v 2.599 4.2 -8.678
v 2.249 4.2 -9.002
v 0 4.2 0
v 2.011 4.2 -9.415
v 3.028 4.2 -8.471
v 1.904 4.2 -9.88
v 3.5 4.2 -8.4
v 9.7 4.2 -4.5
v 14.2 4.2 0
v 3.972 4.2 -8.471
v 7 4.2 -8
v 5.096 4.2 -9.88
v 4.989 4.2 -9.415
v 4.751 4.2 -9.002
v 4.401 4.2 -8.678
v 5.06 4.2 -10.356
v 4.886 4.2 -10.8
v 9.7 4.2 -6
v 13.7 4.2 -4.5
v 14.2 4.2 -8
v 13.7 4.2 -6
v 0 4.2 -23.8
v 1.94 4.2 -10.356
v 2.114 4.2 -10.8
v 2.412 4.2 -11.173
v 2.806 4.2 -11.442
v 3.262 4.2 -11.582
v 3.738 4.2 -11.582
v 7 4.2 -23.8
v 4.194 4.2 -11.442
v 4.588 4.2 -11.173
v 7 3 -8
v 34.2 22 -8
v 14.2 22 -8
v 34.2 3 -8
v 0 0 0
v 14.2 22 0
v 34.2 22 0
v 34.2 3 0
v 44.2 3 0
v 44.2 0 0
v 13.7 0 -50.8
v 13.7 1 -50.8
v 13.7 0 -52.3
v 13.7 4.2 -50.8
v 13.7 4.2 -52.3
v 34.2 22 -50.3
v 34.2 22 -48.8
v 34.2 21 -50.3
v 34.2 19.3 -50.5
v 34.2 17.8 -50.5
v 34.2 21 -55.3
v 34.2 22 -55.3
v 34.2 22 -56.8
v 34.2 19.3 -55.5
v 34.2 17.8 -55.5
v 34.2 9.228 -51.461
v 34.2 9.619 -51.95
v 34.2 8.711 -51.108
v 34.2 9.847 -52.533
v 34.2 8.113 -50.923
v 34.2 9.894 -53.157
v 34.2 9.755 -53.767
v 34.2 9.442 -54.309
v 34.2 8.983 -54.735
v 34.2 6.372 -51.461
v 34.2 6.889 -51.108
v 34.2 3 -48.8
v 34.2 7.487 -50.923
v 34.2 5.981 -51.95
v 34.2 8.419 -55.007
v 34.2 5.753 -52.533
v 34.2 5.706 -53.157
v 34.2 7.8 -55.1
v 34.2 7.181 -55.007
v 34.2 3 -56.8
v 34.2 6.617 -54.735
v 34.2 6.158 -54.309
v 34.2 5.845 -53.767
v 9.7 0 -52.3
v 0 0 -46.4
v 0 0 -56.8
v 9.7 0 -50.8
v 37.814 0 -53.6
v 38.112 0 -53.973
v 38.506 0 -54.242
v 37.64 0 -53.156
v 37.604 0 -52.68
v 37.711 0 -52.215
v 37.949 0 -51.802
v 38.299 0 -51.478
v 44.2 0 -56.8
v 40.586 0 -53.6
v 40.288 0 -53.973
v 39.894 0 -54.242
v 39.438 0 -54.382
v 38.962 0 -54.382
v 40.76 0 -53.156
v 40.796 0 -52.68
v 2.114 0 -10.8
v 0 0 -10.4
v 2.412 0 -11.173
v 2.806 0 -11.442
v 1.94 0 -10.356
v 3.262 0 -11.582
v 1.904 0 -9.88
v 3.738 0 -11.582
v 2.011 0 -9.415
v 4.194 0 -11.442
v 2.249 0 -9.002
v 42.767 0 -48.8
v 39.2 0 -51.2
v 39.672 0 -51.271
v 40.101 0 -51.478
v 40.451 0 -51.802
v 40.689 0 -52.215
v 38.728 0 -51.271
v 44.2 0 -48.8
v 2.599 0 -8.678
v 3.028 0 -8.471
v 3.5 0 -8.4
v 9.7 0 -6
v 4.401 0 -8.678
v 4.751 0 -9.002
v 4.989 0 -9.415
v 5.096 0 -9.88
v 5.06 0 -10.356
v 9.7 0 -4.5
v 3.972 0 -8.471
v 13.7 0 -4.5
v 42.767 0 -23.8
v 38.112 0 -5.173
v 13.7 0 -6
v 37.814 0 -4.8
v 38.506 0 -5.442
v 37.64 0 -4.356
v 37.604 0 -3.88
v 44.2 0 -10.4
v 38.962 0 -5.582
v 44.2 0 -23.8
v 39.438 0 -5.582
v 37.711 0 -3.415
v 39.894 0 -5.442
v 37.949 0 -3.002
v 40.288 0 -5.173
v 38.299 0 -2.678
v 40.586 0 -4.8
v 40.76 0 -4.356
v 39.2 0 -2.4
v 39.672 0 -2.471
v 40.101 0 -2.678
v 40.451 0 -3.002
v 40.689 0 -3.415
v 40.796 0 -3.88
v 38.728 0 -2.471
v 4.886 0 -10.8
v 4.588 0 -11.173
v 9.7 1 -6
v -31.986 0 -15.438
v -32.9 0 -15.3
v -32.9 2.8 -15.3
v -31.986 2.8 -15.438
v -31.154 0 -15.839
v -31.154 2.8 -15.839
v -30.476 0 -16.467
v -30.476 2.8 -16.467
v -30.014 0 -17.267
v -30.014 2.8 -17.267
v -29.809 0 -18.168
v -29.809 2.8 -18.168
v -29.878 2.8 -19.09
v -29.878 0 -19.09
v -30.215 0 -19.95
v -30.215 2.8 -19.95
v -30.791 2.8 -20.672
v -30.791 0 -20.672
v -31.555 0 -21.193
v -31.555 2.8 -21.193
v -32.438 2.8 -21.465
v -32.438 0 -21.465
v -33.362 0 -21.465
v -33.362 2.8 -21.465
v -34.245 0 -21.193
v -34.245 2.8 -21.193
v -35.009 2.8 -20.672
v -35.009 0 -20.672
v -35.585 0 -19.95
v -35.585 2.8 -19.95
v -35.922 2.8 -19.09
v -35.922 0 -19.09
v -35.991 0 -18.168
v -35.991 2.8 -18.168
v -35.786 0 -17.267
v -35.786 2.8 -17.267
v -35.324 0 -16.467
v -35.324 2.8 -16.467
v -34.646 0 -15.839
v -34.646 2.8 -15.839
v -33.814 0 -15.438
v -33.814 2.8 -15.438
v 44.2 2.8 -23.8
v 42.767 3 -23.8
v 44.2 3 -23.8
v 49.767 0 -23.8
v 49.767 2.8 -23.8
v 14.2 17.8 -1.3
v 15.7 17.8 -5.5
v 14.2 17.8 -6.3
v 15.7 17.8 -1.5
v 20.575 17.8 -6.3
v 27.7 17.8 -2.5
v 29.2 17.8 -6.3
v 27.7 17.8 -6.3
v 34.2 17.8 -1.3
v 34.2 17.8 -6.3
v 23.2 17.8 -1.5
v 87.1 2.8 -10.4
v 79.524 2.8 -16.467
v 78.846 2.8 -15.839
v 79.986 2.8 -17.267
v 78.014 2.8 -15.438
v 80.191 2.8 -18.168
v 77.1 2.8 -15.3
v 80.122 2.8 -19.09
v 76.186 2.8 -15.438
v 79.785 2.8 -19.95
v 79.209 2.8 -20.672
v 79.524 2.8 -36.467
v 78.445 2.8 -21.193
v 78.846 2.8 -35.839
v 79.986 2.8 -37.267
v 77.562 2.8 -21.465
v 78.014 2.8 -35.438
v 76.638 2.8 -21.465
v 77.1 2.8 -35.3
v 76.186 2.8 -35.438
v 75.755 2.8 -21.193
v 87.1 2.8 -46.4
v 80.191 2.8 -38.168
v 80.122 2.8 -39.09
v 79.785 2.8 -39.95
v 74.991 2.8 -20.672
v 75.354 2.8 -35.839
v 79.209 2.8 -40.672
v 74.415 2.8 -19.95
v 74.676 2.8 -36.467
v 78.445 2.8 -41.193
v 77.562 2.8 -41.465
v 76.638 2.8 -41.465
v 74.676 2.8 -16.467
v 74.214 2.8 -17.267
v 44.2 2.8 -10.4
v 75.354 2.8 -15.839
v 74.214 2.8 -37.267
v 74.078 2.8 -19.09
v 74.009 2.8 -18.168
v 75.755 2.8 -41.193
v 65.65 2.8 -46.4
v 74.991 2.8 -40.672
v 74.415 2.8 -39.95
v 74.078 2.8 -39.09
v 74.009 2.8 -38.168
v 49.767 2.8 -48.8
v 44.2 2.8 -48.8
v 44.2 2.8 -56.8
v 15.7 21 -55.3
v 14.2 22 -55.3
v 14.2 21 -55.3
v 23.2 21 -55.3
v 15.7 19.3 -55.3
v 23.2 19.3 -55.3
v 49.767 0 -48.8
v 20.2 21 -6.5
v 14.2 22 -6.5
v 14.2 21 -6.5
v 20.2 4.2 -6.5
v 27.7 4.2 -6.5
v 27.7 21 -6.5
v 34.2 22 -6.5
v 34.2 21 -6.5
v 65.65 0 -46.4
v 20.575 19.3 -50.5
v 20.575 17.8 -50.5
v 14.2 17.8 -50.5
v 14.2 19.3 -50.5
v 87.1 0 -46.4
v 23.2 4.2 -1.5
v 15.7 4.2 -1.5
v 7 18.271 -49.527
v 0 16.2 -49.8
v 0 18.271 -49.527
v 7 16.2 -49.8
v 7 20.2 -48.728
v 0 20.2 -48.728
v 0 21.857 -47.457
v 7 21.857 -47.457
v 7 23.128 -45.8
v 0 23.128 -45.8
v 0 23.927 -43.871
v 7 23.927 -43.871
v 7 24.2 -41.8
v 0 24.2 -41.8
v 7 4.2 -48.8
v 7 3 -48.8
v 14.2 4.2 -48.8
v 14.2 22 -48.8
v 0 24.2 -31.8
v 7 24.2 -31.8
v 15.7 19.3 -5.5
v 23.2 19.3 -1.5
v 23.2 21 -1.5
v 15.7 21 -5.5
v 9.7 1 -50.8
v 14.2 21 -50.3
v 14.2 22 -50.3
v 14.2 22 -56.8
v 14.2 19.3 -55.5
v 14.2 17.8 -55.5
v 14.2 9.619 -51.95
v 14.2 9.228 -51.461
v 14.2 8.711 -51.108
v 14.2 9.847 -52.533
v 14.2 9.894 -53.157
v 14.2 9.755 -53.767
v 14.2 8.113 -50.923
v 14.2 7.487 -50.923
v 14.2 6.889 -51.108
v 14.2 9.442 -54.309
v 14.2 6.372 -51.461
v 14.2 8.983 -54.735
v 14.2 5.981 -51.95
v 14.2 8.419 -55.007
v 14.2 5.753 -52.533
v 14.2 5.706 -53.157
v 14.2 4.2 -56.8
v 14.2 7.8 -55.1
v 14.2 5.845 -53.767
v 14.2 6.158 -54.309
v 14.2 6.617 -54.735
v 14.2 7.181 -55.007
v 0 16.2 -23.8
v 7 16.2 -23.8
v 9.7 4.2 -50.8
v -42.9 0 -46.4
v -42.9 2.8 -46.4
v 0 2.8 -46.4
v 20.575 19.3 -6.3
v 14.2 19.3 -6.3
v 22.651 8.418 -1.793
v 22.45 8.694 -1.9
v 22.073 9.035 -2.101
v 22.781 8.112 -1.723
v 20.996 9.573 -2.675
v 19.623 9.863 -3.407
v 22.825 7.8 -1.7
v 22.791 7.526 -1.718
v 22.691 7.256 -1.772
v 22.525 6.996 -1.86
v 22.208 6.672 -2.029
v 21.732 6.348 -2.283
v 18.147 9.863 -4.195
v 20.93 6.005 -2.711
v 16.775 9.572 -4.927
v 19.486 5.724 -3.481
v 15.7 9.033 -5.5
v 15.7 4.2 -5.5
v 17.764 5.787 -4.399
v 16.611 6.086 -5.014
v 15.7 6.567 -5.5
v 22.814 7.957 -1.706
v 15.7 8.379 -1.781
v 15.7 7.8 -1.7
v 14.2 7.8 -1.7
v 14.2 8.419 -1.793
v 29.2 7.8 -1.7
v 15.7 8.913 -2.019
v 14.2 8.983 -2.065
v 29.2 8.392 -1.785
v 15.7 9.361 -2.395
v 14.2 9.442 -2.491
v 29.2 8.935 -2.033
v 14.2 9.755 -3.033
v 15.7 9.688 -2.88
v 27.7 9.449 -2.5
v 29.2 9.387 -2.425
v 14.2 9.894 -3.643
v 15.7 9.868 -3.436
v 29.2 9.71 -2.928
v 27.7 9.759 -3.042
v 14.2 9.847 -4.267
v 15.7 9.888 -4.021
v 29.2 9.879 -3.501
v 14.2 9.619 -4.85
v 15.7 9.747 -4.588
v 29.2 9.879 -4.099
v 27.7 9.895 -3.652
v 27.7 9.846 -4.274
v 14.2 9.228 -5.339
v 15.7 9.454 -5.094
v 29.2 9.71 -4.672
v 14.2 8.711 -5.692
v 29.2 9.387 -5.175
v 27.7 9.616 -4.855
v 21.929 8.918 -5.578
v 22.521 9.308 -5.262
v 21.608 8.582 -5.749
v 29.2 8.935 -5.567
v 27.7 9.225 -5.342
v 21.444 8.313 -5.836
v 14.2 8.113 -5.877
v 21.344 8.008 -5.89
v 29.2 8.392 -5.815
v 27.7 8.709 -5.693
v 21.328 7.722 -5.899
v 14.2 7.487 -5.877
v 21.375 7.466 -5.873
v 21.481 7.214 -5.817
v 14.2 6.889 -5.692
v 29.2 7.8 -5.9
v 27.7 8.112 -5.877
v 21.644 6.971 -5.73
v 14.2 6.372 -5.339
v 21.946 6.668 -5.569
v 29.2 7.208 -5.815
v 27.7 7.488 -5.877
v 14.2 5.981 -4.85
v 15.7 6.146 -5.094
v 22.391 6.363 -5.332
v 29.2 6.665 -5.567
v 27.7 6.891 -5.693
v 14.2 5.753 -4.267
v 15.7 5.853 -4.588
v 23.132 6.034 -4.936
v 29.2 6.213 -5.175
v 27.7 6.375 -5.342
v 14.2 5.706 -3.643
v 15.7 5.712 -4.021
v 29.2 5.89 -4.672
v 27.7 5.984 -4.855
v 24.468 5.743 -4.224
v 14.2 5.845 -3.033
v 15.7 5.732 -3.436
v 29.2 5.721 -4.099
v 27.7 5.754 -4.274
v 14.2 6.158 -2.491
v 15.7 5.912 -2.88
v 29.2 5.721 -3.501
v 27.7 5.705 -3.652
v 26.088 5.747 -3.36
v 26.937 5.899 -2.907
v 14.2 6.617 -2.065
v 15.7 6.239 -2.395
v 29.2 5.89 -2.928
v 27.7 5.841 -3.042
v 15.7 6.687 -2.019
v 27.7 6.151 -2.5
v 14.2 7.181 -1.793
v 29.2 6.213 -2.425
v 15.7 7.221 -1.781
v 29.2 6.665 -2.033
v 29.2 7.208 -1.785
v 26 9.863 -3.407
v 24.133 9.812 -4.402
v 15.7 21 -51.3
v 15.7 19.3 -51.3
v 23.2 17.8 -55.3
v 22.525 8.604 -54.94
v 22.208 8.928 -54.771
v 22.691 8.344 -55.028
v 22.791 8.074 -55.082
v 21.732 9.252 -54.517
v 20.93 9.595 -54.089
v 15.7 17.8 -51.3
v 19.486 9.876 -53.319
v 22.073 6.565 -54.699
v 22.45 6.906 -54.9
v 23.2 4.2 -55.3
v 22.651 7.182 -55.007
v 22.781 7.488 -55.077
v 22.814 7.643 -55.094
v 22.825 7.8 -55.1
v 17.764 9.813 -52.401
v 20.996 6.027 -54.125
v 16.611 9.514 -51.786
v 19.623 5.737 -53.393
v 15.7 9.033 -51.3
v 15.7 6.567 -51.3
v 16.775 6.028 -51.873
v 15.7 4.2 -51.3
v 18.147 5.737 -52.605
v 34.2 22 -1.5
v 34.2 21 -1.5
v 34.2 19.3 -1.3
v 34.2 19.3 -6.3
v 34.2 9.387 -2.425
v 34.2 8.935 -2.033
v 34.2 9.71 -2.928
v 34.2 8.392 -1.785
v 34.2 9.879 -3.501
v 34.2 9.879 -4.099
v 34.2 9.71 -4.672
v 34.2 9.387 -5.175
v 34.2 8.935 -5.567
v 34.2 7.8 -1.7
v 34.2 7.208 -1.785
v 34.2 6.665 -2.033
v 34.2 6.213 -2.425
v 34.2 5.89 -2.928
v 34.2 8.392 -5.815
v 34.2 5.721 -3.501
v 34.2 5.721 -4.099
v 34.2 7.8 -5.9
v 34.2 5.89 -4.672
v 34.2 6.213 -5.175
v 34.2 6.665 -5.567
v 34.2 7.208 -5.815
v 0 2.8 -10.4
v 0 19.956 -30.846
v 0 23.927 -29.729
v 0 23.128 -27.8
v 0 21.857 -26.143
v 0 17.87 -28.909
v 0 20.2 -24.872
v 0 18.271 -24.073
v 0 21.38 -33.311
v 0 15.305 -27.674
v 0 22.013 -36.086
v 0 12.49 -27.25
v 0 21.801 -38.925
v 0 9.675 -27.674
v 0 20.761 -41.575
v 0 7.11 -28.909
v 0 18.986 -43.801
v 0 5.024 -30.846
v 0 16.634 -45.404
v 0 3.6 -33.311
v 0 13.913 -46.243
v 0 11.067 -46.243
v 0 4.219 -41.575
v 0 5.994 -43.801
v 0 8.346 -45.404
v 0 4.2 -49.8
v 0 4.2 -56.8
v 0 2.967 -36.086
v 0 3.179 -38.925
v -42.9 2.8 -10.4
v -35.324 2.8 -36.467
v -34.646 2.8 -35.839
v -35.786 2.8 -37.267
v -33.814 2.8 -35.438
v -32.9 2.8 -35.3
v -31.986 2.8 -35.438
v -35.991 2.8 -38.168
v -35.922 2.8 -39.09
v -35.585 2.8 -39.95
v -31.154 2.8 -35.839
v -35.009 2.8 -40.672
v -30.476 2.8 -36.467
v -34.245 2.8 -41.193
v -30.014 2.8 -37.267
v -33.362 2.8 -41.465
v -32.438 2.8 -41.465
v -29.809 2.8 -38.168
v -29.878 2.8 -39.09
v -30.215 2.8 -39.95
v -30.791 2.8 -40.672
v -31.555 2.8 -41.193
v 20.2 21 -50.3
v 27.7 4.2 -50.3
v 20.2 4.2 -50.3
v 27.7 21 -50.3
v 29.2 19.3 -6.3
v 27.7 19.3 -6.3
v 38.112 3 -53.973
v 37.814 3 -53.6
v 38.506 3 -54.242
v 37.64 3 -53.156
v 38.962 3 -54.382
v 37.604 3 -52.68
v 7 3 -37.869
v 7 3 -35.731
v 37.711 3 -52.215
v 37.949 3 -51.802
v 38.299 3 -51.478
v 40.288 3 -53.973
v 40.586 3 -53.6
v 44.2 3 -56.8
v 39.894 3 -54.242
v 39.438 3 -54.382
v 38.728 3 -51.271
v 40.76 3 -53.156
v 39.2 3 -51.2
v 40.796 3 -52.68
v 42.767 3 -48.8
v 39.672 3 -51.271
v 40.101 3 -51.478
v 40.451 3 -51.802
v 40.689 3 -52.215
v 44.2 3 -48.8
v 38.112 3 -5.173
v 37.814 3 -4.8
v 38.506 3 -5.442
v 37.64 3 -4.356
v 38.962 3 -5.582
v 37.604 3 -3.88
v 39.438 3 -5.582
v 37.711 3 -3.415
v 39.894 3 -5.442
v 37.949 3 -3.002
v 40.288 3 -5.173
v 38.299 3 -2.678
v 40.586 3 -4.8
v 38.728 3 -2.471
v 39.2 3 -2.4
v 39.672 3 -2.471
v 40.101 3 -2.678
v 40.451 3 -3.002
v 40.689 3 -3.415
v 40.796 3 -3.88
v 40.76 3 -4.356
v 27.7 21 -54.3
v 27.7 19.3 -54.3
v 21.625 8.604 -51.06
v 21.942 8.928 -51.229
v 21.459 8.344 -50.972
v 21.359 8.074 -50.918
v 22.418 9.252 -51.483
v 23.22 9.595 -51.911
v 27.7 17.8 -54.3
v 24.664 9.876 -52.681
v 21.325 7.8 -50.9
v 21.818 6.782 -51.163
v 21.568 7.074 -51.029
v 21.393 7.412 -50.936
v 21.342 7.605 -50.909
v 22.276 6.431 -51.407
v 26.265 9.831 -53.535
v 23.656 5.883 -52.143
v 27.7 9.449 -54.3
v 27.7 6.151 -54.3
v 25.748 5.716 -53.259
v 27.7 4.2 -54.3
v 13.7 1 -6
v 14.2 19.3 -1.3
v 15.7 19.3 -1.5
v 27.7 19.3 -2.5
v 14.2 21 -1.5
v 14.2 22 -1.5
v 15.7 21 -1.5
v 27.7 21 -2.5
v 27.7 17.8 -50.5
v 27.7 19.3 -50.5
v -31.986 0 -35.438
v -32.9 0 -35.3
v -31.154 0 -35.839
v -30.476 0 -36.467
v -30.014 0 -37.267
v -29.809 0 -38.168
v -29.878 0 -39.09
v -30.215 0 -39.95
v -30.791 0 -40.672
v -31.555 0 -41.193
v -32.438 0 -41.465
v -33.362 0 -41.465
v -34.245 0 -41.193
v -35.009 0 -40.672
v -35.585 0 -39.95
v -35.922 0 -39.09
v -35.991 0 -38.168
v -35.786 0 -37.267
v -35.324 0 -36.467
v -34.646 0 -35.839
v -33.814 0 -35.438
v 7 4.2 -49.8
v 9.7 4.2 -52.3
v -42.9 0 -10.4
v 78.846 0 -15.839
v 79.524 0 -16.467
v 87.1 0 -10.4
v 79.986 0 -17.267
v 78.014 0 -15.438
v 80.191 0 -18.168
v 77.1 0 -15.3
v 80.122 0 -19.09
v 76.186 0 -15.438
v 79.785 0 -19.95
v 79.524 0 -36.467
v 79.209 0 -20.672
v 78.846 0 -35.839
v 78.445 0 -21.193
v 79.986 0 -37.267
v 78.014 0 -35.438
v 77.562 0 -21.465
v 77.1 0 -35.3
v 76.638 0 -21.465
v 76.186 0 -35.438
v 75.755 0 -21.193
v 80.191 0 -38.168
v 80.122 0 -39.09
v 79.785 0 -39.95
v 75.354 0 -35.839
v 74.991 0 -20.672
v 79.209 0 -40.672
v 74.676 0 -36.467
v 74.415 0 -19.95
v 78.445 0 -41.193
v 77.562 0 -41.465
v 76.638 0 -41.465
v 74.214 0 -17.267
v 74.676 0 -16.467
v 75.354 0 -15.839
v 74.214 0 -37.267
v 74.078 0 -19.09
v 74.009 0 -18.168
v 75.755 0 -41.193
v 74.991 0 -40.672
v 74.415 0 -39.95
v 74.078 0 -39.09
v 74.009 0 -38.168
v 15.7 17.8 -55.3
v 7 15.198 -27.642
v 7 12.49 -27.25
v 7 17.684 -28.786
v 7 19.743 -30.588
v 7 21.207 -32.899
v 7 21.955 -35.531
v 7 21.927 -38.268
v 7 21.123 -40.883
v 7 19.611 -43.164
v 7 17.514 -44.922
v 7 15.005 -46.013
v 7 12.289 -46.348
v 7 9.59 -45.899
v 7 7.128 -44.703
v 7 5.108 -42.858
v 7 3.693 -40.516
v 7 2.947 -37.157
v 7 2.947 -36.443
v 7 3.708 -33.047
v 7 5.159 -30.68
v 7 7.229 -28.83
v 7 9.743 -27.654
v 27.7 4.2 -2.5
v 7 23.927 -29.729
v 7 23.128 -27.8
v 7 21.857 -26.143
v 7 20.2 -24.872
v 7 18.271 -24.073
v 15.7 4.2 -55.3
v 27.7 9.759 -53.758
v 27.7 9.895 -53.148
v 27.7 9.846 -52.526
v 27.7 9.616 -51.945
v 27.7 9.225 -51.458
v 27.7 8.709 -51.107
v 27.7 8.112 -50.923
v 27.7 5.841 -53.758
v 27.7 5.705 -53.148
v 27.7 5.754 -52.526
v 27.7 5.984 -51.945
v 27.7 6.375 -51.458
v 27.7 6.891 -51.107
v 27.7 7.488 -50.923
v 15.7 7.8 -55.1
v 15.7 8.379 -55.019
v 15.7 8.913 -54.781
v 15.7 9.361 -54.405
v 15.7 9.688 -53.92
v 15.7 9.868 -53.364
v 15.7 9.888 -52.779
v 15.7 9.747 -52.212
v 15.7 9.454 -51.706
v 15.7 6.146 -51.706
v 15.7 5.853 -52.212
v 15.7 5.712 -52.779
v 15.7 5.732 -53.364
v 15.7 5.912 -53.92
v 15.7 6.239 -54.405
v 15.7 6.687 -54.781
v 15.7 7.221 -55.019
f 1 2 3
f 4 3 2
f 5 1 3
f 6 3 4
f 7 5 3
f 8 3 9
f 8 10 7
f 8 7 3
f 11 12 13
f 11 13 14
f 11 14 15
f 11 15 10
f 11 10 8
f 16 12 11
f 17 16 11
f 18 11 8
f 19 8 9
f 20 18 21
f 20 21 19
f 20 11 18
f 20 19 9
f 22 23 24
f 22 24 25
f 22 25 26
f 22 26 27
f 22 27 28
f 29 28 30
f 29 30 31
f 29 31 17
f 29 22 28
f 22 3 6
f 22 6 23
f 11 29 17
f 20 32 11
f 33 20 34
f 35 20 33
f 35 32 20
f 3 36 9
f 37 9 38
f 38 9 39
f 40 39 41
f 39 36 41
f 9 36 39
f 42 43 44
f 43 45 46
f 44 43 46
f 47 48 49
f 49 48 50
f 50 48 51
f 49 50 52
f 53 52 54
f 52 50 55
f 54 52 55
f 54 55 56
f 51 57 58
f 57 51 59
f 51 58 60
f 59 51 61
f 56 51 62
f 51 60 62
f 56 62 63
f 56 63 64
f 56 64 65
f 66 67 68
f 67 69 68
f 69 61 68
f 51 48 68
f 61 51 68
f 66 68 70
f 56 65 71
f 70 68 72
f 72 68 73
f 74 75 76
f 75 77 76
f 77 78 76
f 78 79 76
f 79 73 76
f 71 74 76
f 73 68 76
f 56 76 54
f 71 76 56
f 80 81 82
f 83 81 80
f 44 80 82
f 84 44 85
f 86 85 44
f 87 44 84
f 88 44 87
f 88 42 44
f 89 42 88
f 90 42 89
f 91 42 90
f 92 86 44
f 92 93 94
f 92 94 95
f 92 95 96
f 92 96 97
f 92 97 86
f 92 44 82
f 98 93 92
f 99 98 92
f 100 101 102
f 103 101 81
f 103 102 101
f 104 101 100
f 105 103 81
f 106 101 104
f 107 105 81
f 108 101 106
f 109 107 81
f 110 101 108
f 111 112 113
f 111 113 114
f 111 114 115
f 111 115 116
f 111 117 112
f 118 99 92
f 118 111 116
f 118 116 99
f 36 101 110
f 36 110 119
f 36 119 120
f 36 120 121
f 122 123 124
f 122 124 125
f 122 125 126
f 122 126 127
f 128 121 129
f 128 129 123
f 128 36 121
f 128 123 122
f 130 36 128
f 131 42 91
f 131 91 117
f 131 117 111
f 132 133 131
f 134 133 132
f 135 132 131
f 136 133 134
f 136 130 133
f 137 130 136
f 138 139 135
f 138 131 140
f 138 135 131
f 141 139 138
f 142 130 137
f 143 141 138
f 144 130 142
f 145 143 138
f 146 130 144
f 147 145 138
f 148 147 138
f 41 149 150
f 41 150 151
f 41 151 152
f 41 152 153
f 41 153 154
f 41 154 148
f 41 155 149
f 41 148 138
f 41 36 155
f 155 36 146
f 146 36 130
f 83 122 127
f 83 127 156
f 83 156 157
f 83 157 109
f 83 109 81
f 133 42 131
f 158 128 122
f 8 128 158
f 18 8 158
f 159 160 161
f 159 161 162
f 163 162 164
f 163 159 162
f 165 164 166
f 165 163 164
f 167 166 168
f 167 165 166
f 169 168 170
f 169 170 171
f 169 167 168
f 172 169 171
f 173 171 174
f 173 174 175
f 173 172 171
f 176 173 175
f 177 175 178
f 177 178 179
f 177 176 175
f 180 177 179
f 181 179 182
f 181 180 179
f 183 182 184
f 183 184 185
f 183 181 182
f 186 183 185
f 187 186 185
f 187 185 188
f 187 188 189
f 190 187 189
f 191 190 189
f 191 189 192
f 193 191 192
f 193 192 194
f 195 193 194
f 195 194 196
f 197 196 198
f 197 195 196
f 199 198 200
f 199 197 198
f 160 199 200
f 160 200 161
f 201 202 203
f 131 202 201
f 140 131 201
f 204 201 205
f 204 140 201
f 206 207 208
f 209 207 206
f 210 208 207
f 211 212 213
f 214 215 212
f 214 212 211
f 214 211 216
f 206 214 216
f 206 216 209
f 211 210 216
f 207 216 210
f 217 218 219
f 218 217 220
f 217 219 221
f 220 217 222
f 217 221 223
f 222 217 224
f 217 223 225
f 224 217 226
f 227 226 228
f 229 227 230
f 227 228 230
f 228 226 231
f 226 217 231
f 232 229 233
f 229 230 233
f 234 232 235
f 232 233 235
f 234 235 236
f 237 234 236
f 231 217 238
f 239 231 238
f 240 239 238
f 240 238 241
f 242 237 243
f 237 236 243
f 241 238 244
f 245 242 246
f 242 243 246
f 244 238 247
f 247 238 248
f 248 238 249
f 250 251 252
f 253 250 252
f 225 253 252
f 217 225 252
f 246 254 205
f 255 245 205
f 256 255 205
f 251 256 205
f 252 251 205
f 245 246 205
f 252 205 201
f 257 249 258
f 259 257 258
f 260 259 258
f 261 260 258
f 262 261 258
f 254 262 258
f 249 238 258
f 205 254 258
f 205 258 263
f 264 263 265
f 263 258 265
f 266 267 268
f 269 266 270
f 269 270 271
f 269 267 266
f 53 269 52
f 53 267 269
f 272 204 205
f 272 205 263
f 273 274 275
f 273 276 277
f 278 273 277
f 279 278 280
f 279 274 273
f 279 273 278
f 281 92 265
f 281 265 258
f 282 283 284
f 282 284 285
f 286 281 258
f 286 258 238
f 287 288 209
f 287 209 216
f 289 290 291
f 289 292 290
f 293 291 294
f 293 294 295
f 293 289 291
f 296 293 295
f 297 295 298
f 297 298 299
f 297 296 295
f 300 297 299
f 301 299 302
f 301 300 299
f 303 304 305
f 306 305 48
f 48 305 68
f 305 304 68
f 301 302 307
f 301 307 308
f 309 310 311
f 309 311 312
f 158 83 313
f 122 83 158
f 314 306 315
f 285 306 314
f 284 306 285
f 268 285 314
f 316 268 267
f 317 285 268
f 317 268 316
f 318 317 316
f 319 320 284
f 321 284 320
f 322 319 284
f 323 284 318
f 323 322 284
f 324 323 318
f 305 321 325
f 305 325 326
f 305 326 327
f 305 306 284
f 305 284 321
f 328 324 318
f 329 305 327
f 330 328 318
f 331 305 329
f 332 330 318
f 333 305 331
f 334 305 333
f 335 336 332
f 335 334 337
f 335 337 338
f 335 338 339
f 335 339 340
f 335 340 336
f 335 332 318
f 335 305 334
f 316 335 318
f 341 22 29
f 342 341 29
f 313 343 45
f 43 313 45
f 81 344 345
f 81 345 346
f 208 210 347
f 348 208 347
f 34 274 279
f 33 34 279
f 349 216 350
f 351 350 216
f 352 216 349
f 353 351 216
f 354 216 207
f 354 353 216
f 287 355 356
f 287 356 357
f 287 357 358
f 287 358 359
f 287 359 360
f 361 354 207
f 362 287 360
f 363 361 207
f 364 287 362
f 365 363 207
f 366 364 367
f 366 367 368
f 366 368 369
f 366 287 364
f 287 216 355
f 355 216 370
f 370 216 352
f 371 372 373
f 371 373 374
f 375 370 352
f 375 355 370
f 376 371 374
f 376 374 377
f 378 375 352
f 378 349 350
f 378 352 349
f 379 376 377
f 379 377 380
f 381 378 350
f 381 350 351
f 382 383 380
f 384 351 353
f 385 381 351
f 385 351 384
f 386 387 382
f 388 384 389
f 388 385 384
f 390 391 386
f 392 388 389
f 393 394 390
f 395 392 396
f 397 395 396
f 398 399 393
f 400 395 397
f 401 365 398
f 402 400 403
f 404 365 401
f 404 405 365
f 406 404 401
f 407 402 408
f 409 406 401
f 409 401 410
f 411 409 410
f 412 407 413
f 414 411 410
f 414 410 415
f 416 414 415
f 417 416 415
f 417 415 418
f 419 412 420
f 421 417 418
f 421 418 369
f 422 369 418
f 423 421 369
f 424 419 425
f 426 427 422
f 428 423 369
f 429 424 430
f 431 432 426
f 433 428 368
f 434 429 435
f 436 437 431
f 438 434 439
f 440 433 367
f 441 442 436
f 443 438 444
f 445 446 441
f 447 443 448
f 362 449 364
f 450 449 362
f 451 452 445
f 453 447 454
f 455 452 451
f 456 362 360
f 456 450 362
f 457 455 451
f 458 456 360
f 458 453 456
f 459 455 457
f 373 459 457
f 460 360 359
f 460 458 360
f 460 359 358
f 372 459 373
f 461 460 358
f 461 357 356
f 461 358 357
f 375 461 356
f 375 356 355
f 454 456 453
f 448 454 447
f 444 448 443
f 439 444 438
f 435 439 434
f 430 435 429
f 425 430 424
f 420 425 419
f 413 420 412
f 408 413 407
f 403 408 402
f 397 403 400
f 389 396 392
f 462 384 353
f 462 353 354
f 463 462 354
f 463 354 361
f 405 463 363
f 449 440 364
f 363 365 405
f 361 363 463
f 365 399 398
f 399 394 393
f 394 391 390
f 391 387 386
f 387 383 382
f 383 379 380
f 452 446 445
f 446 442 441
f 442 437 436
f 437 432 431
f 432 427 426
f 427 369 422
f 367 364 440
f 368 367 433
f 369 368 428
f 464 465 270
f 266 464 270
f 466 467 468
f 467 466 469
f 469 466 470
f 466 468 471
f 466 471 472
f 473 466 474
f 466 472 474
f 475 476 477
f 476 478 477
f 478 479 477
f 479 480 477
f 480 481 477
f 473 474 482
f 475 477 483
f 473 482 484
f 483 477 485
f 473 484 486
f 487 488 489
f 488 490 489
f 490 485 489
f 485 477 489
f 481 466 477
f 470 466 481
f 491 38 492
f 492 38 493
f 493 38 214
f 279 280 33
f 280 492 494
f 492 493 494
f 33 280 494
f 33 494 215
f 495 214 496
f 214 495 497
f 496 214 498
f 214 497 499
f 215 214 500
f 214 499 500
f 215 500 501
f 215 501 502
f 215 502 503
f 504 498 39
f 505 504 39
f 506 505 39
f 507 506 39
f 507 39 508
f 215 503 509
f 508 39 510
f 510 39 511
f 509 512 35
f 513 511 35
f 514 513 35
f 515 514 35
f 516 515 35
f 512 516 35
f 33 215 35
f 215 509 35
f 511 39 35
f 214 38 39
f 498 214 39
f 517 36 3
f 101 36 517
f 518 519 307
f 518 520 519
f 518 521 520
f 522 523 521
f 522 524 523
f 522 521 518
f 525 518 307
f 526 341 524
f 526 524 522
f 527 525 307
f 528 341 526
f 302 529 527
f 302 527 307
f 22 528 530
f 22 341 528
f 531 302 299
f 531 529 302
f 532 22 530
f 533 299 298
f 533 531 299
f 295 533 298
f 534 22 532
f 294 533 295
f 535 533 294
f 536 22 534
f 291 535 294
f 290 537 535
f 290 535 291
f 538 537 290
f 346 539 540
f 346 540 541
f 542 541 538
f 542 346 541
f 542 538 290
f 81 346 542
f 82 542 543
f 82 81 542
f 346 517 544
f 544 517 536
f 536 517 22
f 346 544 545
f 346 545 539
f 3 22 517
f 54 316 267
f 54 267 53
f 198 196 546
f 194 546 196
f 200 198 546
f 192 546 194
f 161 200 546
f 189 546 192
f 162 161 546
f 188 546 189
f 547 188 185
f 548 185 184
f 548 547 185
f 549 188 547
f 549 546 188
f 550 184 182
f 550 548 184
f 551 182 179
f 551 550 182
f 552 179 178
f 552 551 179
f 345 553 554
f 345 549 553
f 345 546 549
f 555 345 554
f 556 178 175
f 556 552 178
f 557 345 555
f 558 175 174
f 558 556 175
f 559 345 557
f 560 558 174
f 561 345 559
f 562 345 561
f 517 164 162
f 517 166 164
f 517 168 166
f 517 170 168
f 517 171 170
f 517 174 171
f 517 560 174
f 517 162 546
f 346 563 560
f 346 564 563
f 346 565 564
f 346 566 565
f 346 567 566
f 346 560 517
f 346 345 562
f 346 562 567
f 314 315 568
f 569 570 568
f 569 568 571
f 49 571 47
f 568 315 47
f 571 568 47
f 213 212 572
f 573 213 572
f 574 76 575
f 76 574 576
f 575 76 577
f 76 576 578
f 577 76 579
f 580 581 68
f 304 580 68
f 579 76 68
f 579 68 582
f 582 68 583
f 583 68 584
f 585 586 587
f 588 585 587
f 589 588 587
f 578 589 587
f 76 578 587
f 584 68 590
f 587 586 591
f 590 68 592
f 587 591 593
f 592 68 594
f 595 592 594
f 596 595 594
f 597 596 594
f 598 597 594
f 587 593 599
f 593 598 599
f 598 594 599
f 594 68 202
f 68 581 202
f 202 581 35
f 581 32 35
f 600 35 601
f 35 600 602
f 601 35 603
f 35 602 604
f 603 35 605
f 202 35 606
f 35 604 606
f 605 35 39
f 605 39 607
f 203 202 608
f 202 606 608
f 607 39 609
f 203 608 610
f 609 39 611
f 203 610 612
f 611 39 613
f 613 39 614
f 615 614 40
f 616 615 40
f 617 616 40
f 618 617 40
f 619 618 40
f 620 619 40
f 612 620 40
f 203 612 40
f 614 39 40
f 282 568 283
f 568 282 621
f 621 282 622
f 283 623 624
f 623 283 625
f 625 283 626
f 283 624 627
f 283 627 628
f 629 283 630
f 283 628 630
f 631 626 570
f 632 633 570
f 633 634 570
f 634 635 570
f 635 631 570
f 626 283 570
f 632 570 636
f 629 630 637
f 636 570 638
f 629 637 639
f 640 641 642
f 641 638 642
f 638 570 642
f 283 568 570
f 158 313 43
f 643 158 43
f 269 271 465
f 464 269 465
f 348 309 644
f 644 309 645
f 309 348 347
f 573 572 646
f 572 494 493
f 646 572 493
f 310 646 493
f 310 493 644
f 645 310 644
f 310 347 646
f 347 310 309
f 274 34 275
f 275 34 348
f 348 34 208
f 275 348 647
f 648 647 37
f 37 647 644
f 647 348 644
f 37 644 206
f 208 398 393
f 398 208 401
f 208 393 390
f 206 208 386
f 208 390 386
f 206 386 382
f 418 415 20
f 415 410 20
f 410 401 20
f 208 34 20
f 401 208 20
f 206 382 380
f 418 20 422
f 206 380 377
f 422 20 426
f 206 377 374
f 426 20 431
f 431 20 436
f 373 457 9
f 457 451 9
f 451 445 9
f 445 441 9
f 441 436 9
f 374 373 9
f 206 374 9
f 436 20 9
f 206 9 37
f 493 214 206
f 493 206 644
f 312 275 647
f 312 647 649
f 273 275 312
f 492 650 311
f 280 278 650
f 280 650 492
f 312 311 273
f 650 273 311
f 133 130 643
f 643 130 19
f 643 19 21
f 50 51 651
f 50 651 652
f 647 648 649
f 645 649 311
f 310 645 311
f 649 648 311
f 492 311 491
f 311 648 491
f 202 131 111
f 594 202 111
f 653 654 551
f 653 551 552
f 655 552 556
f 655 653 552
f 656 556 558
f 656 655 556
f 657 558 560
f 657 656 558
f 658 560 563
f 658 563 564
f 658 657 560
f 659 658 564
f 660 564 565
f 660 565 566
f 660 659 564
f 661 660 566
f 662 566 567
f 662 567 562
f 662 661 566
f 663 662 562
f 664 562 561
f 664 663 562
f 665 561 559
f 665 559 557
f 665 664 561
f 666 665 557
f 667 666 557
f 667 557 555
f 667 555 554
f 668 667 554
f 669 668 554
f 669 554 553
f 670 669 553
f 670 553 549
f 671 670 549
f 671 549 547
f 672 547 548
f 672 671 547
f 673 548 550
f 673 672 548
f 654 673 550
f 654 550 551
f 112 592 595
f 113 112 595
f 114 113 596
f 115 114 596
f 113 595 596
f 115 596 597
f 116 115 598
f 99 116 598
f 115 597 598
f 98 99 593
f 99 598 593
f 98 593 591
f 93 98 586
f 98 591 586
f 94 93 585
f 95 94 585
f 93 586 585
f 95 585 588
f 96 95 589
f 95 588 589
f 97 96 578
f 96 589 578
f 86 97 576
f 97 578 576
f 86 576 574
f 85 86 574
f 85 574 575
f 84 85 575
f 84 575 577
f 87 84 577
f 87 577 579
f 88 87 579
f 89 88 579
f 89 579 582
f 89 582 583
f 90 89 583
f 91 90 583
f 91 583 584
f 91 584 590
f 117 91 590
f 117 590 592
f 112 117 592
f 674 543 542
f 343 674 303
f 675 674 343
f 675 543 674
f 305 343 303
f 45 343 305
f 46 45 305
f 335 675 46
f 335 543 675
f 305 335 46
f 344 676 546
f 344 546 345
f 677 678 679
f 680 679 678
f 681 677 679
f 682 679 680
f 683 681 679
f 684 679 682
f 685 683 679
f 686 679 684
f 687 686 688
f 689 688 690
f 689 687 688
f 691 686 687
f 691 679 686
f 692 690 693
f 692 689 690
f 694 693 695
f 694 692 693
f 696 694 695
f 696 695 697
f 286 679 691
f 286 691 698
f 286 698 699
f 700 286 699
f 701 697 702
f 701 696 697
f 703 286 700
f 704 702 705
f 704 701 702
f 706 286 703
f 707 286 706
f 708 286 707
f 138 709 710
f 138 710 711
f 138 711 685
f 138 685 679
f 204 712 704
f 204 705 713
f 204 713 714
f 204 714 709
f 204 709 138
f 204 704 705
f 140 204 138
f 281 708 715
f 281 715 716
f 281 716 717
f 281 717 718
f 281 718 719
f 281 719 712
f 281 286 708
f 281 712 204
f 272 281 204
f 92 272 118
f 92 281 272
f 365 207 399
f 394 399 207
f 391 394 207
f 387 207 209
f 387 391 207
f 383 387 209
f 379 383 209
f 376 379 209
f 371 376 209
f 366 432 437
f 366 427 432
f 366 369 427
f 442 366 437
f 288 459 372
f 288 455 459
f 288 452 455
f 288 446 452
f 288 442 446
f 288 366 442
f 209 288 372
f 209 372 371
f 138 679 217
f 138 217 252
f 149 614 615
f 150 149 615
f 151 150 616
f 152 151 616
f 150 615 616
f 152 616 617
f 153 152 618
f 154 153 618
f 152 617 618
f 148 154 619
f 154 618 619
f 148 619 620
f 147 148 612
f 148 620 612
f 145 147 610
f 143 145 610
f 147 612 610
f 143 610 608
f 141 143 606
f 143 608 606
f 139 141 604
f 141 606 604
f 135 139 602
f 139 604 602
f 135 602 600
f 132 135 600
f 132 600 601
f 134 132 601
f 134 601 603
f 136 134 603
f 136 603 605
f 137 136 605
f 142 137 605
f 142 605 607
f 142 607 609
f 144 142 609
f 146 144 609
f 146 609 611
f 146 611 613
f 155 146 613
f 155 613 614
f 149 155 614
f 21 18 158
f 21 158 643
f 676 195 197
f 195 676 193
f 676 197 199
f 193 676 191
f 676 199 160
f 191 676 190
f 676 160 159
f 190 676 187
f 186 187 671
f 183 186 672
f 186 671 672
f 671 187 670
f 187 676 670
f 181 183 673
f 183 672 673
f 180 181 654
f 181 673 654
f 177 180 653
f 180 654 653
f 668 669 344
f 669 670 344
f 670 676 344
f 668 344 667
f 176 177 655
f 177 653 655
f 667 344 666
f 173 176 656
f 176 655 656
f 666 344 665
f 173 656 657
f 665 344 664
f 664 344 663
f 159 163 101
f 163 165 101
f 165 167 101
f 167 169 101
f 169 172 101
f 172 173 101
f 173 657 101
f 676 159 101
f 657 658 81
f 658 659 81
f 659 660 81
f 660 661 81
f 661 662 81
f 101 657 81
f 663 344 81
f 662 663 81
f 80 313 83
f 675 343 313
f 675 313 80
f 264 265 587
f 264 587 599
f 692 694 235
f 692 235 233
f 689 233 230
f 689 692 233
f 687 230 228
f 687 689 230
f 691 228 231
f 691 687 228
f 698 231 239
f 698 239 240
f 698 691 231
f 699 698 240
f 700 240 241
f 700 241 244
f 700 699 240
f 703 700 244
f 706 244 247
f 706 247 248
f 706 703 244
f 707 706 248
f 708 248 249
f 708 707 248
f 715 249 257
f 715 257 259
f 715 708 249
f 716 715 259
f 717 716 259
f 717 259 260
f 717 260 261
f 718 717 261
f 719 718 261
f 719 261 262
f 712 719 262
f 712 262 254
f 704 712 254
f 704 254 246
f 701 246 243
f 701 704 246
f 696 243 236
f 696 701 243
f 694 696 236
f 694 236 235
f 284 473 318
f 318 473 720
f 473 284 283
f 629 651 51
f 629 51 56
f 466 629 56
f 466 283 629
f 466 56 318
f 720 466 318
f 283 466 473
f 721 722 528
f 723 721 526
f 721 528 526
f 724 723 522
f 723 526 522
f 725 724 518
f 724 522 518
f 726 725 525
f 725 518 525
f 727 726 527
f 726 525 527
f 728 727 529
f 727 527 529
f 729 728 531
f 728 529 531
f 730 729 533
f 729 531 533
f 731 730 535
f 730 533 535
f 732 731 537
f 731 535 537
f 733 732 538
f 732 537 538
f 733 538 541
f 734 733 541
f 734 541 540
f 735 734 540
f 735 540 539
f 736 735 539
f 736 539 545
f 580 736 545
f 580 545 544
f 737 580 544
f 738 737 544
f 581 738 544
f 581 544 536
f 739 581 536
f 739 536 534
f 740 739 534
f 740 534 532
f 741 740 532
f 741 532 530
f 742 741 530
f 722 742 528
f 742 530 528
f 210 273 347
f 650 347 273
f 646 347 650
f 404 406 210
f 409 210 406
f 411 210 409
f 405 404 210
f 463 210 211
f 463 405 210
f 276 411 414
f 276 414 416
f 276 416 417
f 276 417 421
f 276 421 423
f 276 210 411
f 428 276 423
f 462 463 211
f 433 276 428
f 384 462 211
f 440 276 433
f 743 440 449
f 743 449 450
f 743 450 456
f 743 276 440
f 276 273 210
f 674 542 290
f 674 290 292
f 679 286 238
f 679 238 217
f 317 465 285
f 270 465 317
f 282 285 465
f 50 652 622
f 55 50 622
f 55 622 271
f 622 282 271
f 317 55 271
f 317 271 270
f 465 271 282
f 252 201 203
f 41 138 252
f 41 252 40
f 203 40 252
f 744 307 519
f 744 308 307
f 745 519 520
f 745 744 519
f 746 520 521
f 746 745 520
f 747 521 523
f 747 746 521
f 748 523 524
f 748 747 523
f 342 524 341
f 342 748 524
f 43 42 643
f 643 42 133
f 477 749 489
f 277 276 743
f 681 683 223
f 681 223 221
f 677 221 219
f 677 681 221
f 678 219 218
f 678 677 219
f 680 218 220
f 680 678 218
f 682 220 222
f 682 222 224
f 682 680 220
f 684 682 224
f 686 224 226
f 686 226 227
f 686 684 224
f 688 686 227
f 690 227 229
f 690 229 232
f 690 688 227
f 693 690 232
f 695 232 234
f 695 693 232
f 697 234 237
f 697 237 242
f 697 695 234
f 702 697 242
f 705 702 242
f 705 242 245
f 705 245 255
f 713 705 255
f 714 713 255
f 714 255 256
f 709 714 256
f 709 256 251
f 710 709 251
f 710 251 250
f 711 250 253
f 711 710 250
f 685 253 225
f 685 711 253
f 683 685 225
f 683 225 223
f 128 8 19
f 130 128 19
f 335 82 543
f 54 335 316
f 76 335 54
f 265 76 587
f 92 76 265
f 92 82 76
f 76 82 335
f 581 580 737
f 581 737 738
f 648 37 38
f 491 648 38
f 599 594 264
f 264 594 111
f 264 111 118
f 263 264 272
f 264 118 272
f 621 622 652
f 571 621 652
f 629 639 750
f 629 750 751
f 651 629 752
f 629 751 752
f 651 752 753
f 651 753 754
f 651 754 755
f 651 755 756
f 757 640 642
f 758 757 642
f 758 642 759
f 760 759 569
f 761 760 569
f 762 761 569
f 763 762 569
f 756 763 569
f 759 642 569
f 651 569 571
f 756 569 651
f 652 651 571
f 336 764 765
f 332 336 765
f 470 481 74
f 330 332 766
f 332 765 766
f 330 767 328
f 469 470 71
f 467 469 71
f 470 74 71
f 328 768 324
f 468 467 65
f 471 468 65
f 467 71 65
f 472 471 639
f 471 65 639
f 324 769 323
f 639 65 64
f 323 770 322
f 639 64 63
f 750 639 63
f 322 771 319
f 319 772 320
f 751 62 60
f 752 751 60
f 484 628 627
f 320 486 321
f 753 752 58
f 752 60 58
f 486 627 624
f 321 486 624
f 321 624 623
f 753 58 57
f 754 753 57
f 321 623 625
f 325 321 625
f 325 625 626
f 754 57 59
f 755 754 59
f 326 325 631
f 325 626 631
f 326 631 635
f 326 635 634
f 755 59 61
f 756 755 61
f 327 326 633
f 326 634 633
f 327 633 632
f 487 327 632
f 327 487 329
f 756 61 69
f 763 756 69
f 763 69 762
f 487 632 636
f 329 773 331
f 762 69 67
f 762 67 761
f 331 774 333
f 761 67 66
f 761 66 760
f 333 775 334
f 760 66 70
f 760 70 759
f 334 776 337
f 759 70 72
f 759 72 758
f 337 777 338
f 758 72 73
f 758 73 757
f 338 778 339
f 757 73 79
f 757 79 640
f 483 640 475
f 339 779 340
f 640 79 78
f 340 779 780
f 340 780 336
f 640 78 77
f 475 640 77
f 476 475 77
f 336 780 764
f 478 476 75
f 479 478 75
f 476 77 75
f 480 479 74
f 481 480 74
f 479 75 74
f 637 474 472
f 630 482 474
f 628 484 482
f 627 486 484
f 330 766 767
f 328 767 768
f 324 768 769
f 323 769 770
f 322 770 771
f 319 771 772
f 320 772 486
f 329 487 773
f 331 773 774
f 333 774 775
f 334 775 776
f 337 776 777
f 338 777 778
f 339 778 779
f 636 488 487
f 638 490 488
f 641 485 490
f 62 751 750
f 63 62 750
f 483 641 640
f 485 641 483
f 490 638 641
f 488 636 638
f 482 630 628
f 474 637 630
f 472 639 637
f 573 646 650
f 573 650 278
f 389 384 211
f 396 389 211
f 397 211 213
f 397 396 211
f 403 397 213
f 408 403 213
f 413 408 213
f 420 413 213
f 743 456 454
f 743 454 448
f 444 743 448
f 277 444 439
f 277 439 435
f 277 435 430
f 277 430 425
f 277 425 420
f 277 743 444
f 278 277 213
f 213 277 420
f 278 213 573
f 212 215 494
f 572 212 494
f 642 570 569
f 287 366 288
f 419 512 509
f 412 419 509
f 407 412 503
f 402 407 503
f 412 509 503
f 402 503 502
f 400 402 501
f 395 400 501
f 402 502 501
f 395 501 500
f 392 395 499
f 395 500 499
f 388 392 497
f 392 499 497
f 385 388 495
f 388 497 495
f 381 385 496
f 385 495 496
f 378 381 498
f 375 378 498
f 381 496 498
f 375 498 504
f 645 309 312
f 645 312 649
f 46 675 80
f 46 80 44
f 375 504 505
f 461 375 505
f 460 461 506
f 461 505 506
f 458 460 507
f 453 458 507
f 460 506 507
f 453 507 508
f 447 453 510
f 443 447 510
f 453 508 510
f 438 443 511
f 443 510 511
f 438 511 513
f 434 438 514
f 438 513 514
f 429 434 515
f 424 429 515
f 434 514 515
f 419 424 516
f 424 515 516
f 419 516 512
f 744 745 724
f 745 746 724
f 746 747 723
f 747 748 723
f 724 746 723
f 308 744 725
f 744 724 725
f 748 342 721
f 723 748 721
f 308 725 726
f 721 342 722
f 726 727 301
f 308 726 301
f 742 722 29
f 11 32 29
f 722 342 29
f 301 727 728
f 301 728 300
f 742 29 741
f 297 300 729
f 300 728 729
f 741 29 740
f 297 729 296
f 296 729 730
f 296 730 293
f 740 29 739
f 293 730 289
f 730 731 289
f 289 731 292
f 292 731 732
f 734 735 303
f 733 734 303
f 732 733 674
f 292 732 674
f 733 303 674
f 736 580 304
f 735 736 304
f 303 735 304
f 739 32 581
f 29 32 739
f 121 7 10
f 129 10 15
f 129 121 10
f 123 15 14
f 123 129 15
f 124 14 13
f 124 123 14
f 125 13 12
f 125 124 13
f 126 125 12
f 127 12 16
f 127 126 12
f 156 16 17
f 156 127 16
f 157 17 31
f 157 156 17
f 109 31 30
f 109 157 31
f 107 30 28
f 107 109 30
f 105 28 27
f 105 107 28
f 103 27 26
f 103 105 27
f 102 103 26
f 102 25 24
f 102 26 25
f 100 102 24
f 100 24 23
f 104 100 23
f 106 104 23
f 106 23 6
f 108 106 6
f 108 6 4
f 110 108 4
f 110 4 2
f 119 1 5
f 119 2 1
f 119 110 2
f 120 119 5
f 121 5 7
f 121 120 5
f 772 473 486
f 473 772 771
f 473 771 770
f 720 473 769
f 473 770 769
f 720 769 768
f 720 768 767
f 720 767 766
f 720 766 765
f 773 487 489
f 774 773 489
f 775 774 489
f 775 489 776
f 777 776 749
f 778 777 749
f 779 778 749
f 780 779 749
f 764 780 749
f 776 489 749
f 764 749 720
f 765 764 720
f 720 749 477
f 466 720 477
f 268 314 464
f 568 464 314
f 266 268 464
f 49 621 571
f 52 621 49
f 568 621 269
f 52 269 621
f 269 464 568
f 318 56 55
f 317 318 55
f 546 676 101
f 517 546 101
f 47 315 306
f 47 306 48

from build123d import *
from build123d.topology import SkipClean

# Parameters (mm, degrees)
BOSS_EXTRU_1_DEPTH           = 4.2
ESQUISSE2_W                  = 5
ESQUISSE2_H                  = 8
BOSS_EXTRU_2_DEPTH           = 22
ENL_V_MAT_EXTRU_2_REACH      = 71.856
ESQUISSE4_R                  = 1.6
EXTRU_MINCE1_OUTLINE_W       = 15
EXTRU_MINCE1_OUTLINE_H       = 8
EXTRU_MINCE1_DEPTH           = 17.8
BOSS_EXTRU_3_DEPTH           = 3
ESQUISSE3_R                  = 2.1
ESQUISSE3_W                  = 5
ESQUISSE3_H                  = 1.5
ENL_V_MAT_EXTRU_1_DEPTH      = 70.856137884
ENL_V_MAT_EXTRU_3_REACH      = 76.437
ESQUISSE7_R                  = 1.6
ESQUISSE8_W                  = 20
ESQUISSE8_H                  = 5
ENL_V_MAT_EXTRU_5_DEPTH      = 1
ESQUISSE9_W                  = 7
ESQUISSE9_H                  = 26
BOSS_EXTRU_4_DEPTH           = 20
ESQUISSE10_R                 = 9.55
ENL_V_MAT_EXTRU_6_DEPTH      = 7
CONG_1_R                     = 8
ESQUISSE11_W                 = 4
ESQUISSE11_H                 = 1.5
ENL_V_MAT_EXTRU_7_DEPTH      = 75.698594364
ESQUISSE12_W                 = 4
ESQUISSE12_H                 = 44.8
ENL_V_MAT_EXTRU_8_DEPTH      = 1
ESQUISSE13_R                 = 3.1
ESQUISSE13_W                 = 42.9
ESQUISSE13_H                 = 36
BOSS_EXTRU_5_DEPTH           = 2.8
ENL_V_MAT_EXTRU_9_DEPTH      = 107.163129193
ENL_V_MAT_EXTRU_9_DEPTH_BACK = 107.163129193
ESQUISSE14_W                 = 7
ESQUISSE14_H                 = 25


# Read off the part's stored shape, not the designer's step: Extru.-Mince1
with BuildPart() as part:
    # Esquisse1 → Boss.-Extru.1 (new body)
    with BuildSketch(Plane(origin=(0, 0, 0), x_dir=(1, 0, 0), z_dir=(0, 1, 0))):
        Polygon((0, 0), (29.2, 0), (29.2, 8), (7, 8), (7, 48.8), (29.2, 48.8), (29.2, 56.8), (0, 56.8), align=None)
    extrude(amount=BOSS_EXTRU_1_DEPTH)

    # Esquisse2 → Boss.-Extru.2 (add)
    with BuildSketch(Plane(origin=(0, 0, 0), x_dir=(1, 0, 0), z_dir=(0, 1, 0))):
        with Locations((31.7, 52.8)):
            Rectangle(ESQUISSE2_W, ESQUISSE2_H)
        with Locations((31.7, 4)):
            Rectangle(ESQUISSE2_W, ESQUISSE2_H)
    extrude(amount=BOSS_EXTRU_2_DEPTH)

    # Esquisse4 → Enlèv. mat.-Extru.2 (cut, up to next)
    with BuildSketch(Plane(origin=(0, 0, 0), x_dir=(1, 0, 0), z_dir=(0, 1, 0)), mode=Mode.PRIVATE) as enl_v_mat_extru_2_sk1:
        with Locations(Location((3.5, 10, 0), (0, 0, 270))):
            Circle(ESQUISSE4_R)
    enl_v_mat_extru_2_tool1 = extrude(enl_v_mat_extru_2_sk1.sketch, amount=ENL_V_MAT_EXTRU_2_REACH, mode=Mode.PRIVATE) & part.part
    add(enl_v_mat_extru_2_tool1.solids().sort_by_distance((3.5, 0, -10))[0], mode=Mode.SUBTRACT)

    # Extru.-Mince1 outline → Extru.-Mince1 (add)
    with BuildSketch(Plane(origin=(0, 4.2, 0), x_dir=(1, 0, 0), z_dir=(0, 1, 0))):
        with Locations((21.7, 52.8)):
            Rectangle(EXTRU_MINCE1_OUTLINE_W, EXTRU_MINCE1_OUTLINE_H)
        Polygon((27.7, 50.3), (20.2, 50.3), (27.7, 54.3), align=None, mode=Mode.SUBTRACT)
        Polygon((15.7, 51.3), (15.7, 55.3), (23.2, 55.3), align=None, mode=Mode.SUBTRACT)
    extru_mince1 = extrude(amount=EXTRU_MINCE1_DEPTH)

    # Esquisse6 → Boss.-Extru.3 (add)
    with BuildSketch(Plane.XZ):
        Polygon((34.2, -8), (7, -8), (7, -48.8), (34.2, -48.8), (34.2, -56.8), (44.2, -56.8), (44.2, 0), (34.2, 0), align=None)
    extrude(amount=-BOSS_EXTRU_3_DEPTH)

    # Esquisse3 → Enlèv. mat.-Extru.1 (cut, through all)
    with BuildSketch(Plane(origin=(34.2, 0, 0), x_dir=(0, 0, -1), z_dir=(1, 0, 0))):
        with Locations((3.8, 7.8)):
            Circle(ESQUISSE3_R)
        with Locations((53, 7.8)):
            Circle(ESQUISSE3_R)
        with Locations((3.8, 18.55)):
            Rectangle(ESQUISSE3_W, ESQUISSE3_H)
        with Locations((53, 18.55)):
            Rectangle(ESQUISSE3_W, ESQUISSE3_H)
    enl_v_mat_extru_1 = extrude(amount=-ENL_V_MAT_EXTRU_1_DEPTH, mode=Mode.SUBTRACT)

    # Symétrie1: Extru.-Mince1, Enlèv. mat.-Extru.1 across plane
    with SkipClean():  # the faces are left unmerged after this step: merging them gives an invalid solid
        add(extru_mince1.mirror(Plane(origin=(0, 0, -28.4), x_dir=(1, 0, 0), z_dir=(0, 0, -1))))
        add(enl_v_mat_extru_1.mirror(Plane(origin=(0, 0, -28.4), x_dir=(1, 0, 0), z_dir=(0, 0, -1))), mode=Mode.SUBTRACT)

    # Esquisse7 → Enlèv. mat.-Extru.3 (cut, up to next)
    with BuildSketch(Plane(origin=(0, 3, 0), x_dir=(1, 0, 0), z_dir=(0, 1, 0)), mode=Mode.PRIVATE) as enl_v_mat_extru_3_sk1:
        with Locations(Location((39.2, 52.8, 0), (0, 0, 270))):
            Circle(ESQUISSE7_R)
    enl_v_mat_extru_3_tool1 = extrude(enl_v_mat_extru_3_sk1.sketch, amount=-ENL_V_MAT_EXTRU_3_REACH, mode=Mode.PRIVATE) & part.part
    # Esquisse7 → Enlèv. mat.-Extru.3 (cut, up to next)
    with BuildSketch(Plane(origin=(0, 3, 0), x_dir=(1, 0, 0), z_dir=(0, 1, 0)), mode=Mode.PRIVATE) as enl_v_mat_extru_3_sk2:
        with Locations(Location((39.2, 4, 0), (0, 0, 270))):
            Circle(ESQUISSE7_R)
    enl_v_mat_extru_3_tool2 = extrude(enl_v_mat_extru_3_sk2.sketch, amount=-ENL_V_MAT_EXTRU_3_REACH, mode=Mode.PRIVATE) & part.part
    add(enl_v_mat_extru_3_tool1.solids().sort_by_distance((39.2, 3, -52.8))[0], mode=Mode.SUBTRACT)
    add(enl_v_mat_extru_3_tool2.solids().sort_by_distance((39.2, 3, -4))[0], mode=Mode.SUBTRACT)

    # Esquisse8 → Enlèv. mat.-Extru.5 (cut)
    with SkipClean():  # the faces are left unmerged after this step: merging them gives an invalid solid
        with BuildSketch(Plane(origin=(0, 22, 0), x_dir=(1, 0, 0), z_dir=(0, 1, 0))):
            with Locations((24.2, 52.8)):
                Rectangle(ESQUISSE8_W, ESQUISSE8_H)
            with Locations((24.2, 4)):
                Rectangle(ESQUISSE8_W, ESQUISSE8_H)
        extrude(amount=-ENL_V_MAT_EXTRU_5_DEPTH, mode=Mode.SUBTRACT)

    # Esquisse9 → Boss.-Extru.4 (add)
    with SkipClean():  # the faces are left unmerged after this step: merging them gives an invalid solid
        with BuildSketch(Plane(origin=(0, 4.2, 0), x_dir=(1, 0, 0), z_dir=(0, 1, 0))):
            with Locations((3.5, 36.8)):
                Rectangle(ESQUISSE9_W, ESQUISSE9_H)
        extrude(amount=BOSS_EXTRU_4_DEPTH)

    # Esquisse10 → Enlèv. mat.-Extru.6 (cut)
    with SkipClean():  # the faces are left unmerged after this step: merging them gives an invalid solid
        with BuildSketch(Plane.ZY):
            with Locations((-36.8, 12.49)):
                Circle(ESQUISSE10_R)
        extrude(amount=-ENL_V_MAT_EXTRU_6_DEPTH, mode=Mode.SUBTRACT)

    # Congé1
    cong_1_edges = [part.edges().sort_by_distance(p)[0] for p in [
        (3.5, 24.2, -23.8),
        (3.5, 24.2, -49.8),
    ]]
    fillet(cong_1_edges, radius=CONG_1_R)

    # Esquisse11 → Enlèv. mat.-Extru.7 (cut, through all)
    with SkipClean():  # the faces are left unmerged after this step: merging them gives an invalid solid
        with BuildSketch(Plane(origin=(0, 4.2, 0), x_dir=(1, 0, 0), z_dir=(0, 1, 0))):
            with Locations((11.7, 51.55)):
                Rectangle(ESQUISSE11_W, ESQUISSE11_H)
            with Locations((11.7, 5.25)):
                Rectangle(ESQUISSE11_W, ESQUISSE11_H)
        extrude(amount=-ENL_V_MAT_EXTRU_7_DEPTH, mode=Mode.SUBTRACT)

    # Esquisse12 → Enlèv. mat.-Extru.8 (cut)
    with SkipClean():  # the faces are left unmerged after this step: merging them gives an invalid solid
        with BuildSketch(Plane.XZ):
            with Locations((11.7, -28.4)):
                Rectangle(ESQUISSE12_W, ESQUISSE12_H)
        extrude(amount=-ENL_V_MAT_EXTRU_8_DEPTH, mode=Mode.SUBTRACT)

    # Esquisse13 → Boss.-Extru.5 (add)
    # profile 1 of 2: a face of its own
    with SkipClean():  # the faces are left unmerged after this step: merging them gives an invalid solid
        with BuildSketch(Plane(origin=(0, 0, 0), x_dir=(1, 0, 0), z_dir=(0, 1, 0))):
            Polygon((65.65, 46.4), (87.1, 46.4), (87.1, 10.4), (44.2, 10.4), (44.2, 46.4), (44.2, 56.8), align=None)
            with Locations(Location((77.1, 38.4, 0), (0, 0, 270))):
                Circle(ESQUISSE13_R, mode=Mode.SUBTRACT)
            with Locations(Location((77.1, 18.4, 0), (0, 0, 270))):
                Circle(ESQUISSE13_R, mode=Mode.SUBTRACT)
        # profile 2 of 2: a face of its own
        with BuildSketch(Plane(origin=(0, 0, 0), x_dir=(1, 0, 0), z_dir=(0, 1, 0))):
            with Locations((-21.45, 28.4)):
                Rectangle(ESQUISSE13_W, ESQUISSE13_H)
            with Locations(Location((-32.9, 18.4, 0), (0, 0, 270))):
                Circle(ESQUISSE13_R, mode=Mode.SUBTRACT)
            with Locations(Location((-32.9, 38.4, 0), (0, 0, 270))):
                Circle(ESQUISSE13_R, mode=Mode.SUBTRACT)
        extrude(amount=BOSS_EXTRU_5_DEPTH)

    # Esquisse14 → Enlèv. mat.-Extru.9 (cut, two sides: drawn at the far end of the back side and taken through both)
    with SkipClean():  # the faces are left unmerged after this step: merging them gives an invalid solid
        with BuildSketch(Plane(origin=(0, 2.8, 0), x_dir=(1, 0, 0), z_dir=(0, 1, 0)).offset(-ENL_V_MAT_EXTRU_9_DEPTH_BACK)):
            with Locations((46.266692991, 36.3)):
                Rectangle(ESQUISSE14_W, ESQUISSE14_H)
        extrude(amount=ENL_V_MAT_EXTRU_9_DEPTH + ENL_V_MAT_EXTRU_9_DEPTH_BACK, mode=Mode.SUBTRACT)


solid = part.part
